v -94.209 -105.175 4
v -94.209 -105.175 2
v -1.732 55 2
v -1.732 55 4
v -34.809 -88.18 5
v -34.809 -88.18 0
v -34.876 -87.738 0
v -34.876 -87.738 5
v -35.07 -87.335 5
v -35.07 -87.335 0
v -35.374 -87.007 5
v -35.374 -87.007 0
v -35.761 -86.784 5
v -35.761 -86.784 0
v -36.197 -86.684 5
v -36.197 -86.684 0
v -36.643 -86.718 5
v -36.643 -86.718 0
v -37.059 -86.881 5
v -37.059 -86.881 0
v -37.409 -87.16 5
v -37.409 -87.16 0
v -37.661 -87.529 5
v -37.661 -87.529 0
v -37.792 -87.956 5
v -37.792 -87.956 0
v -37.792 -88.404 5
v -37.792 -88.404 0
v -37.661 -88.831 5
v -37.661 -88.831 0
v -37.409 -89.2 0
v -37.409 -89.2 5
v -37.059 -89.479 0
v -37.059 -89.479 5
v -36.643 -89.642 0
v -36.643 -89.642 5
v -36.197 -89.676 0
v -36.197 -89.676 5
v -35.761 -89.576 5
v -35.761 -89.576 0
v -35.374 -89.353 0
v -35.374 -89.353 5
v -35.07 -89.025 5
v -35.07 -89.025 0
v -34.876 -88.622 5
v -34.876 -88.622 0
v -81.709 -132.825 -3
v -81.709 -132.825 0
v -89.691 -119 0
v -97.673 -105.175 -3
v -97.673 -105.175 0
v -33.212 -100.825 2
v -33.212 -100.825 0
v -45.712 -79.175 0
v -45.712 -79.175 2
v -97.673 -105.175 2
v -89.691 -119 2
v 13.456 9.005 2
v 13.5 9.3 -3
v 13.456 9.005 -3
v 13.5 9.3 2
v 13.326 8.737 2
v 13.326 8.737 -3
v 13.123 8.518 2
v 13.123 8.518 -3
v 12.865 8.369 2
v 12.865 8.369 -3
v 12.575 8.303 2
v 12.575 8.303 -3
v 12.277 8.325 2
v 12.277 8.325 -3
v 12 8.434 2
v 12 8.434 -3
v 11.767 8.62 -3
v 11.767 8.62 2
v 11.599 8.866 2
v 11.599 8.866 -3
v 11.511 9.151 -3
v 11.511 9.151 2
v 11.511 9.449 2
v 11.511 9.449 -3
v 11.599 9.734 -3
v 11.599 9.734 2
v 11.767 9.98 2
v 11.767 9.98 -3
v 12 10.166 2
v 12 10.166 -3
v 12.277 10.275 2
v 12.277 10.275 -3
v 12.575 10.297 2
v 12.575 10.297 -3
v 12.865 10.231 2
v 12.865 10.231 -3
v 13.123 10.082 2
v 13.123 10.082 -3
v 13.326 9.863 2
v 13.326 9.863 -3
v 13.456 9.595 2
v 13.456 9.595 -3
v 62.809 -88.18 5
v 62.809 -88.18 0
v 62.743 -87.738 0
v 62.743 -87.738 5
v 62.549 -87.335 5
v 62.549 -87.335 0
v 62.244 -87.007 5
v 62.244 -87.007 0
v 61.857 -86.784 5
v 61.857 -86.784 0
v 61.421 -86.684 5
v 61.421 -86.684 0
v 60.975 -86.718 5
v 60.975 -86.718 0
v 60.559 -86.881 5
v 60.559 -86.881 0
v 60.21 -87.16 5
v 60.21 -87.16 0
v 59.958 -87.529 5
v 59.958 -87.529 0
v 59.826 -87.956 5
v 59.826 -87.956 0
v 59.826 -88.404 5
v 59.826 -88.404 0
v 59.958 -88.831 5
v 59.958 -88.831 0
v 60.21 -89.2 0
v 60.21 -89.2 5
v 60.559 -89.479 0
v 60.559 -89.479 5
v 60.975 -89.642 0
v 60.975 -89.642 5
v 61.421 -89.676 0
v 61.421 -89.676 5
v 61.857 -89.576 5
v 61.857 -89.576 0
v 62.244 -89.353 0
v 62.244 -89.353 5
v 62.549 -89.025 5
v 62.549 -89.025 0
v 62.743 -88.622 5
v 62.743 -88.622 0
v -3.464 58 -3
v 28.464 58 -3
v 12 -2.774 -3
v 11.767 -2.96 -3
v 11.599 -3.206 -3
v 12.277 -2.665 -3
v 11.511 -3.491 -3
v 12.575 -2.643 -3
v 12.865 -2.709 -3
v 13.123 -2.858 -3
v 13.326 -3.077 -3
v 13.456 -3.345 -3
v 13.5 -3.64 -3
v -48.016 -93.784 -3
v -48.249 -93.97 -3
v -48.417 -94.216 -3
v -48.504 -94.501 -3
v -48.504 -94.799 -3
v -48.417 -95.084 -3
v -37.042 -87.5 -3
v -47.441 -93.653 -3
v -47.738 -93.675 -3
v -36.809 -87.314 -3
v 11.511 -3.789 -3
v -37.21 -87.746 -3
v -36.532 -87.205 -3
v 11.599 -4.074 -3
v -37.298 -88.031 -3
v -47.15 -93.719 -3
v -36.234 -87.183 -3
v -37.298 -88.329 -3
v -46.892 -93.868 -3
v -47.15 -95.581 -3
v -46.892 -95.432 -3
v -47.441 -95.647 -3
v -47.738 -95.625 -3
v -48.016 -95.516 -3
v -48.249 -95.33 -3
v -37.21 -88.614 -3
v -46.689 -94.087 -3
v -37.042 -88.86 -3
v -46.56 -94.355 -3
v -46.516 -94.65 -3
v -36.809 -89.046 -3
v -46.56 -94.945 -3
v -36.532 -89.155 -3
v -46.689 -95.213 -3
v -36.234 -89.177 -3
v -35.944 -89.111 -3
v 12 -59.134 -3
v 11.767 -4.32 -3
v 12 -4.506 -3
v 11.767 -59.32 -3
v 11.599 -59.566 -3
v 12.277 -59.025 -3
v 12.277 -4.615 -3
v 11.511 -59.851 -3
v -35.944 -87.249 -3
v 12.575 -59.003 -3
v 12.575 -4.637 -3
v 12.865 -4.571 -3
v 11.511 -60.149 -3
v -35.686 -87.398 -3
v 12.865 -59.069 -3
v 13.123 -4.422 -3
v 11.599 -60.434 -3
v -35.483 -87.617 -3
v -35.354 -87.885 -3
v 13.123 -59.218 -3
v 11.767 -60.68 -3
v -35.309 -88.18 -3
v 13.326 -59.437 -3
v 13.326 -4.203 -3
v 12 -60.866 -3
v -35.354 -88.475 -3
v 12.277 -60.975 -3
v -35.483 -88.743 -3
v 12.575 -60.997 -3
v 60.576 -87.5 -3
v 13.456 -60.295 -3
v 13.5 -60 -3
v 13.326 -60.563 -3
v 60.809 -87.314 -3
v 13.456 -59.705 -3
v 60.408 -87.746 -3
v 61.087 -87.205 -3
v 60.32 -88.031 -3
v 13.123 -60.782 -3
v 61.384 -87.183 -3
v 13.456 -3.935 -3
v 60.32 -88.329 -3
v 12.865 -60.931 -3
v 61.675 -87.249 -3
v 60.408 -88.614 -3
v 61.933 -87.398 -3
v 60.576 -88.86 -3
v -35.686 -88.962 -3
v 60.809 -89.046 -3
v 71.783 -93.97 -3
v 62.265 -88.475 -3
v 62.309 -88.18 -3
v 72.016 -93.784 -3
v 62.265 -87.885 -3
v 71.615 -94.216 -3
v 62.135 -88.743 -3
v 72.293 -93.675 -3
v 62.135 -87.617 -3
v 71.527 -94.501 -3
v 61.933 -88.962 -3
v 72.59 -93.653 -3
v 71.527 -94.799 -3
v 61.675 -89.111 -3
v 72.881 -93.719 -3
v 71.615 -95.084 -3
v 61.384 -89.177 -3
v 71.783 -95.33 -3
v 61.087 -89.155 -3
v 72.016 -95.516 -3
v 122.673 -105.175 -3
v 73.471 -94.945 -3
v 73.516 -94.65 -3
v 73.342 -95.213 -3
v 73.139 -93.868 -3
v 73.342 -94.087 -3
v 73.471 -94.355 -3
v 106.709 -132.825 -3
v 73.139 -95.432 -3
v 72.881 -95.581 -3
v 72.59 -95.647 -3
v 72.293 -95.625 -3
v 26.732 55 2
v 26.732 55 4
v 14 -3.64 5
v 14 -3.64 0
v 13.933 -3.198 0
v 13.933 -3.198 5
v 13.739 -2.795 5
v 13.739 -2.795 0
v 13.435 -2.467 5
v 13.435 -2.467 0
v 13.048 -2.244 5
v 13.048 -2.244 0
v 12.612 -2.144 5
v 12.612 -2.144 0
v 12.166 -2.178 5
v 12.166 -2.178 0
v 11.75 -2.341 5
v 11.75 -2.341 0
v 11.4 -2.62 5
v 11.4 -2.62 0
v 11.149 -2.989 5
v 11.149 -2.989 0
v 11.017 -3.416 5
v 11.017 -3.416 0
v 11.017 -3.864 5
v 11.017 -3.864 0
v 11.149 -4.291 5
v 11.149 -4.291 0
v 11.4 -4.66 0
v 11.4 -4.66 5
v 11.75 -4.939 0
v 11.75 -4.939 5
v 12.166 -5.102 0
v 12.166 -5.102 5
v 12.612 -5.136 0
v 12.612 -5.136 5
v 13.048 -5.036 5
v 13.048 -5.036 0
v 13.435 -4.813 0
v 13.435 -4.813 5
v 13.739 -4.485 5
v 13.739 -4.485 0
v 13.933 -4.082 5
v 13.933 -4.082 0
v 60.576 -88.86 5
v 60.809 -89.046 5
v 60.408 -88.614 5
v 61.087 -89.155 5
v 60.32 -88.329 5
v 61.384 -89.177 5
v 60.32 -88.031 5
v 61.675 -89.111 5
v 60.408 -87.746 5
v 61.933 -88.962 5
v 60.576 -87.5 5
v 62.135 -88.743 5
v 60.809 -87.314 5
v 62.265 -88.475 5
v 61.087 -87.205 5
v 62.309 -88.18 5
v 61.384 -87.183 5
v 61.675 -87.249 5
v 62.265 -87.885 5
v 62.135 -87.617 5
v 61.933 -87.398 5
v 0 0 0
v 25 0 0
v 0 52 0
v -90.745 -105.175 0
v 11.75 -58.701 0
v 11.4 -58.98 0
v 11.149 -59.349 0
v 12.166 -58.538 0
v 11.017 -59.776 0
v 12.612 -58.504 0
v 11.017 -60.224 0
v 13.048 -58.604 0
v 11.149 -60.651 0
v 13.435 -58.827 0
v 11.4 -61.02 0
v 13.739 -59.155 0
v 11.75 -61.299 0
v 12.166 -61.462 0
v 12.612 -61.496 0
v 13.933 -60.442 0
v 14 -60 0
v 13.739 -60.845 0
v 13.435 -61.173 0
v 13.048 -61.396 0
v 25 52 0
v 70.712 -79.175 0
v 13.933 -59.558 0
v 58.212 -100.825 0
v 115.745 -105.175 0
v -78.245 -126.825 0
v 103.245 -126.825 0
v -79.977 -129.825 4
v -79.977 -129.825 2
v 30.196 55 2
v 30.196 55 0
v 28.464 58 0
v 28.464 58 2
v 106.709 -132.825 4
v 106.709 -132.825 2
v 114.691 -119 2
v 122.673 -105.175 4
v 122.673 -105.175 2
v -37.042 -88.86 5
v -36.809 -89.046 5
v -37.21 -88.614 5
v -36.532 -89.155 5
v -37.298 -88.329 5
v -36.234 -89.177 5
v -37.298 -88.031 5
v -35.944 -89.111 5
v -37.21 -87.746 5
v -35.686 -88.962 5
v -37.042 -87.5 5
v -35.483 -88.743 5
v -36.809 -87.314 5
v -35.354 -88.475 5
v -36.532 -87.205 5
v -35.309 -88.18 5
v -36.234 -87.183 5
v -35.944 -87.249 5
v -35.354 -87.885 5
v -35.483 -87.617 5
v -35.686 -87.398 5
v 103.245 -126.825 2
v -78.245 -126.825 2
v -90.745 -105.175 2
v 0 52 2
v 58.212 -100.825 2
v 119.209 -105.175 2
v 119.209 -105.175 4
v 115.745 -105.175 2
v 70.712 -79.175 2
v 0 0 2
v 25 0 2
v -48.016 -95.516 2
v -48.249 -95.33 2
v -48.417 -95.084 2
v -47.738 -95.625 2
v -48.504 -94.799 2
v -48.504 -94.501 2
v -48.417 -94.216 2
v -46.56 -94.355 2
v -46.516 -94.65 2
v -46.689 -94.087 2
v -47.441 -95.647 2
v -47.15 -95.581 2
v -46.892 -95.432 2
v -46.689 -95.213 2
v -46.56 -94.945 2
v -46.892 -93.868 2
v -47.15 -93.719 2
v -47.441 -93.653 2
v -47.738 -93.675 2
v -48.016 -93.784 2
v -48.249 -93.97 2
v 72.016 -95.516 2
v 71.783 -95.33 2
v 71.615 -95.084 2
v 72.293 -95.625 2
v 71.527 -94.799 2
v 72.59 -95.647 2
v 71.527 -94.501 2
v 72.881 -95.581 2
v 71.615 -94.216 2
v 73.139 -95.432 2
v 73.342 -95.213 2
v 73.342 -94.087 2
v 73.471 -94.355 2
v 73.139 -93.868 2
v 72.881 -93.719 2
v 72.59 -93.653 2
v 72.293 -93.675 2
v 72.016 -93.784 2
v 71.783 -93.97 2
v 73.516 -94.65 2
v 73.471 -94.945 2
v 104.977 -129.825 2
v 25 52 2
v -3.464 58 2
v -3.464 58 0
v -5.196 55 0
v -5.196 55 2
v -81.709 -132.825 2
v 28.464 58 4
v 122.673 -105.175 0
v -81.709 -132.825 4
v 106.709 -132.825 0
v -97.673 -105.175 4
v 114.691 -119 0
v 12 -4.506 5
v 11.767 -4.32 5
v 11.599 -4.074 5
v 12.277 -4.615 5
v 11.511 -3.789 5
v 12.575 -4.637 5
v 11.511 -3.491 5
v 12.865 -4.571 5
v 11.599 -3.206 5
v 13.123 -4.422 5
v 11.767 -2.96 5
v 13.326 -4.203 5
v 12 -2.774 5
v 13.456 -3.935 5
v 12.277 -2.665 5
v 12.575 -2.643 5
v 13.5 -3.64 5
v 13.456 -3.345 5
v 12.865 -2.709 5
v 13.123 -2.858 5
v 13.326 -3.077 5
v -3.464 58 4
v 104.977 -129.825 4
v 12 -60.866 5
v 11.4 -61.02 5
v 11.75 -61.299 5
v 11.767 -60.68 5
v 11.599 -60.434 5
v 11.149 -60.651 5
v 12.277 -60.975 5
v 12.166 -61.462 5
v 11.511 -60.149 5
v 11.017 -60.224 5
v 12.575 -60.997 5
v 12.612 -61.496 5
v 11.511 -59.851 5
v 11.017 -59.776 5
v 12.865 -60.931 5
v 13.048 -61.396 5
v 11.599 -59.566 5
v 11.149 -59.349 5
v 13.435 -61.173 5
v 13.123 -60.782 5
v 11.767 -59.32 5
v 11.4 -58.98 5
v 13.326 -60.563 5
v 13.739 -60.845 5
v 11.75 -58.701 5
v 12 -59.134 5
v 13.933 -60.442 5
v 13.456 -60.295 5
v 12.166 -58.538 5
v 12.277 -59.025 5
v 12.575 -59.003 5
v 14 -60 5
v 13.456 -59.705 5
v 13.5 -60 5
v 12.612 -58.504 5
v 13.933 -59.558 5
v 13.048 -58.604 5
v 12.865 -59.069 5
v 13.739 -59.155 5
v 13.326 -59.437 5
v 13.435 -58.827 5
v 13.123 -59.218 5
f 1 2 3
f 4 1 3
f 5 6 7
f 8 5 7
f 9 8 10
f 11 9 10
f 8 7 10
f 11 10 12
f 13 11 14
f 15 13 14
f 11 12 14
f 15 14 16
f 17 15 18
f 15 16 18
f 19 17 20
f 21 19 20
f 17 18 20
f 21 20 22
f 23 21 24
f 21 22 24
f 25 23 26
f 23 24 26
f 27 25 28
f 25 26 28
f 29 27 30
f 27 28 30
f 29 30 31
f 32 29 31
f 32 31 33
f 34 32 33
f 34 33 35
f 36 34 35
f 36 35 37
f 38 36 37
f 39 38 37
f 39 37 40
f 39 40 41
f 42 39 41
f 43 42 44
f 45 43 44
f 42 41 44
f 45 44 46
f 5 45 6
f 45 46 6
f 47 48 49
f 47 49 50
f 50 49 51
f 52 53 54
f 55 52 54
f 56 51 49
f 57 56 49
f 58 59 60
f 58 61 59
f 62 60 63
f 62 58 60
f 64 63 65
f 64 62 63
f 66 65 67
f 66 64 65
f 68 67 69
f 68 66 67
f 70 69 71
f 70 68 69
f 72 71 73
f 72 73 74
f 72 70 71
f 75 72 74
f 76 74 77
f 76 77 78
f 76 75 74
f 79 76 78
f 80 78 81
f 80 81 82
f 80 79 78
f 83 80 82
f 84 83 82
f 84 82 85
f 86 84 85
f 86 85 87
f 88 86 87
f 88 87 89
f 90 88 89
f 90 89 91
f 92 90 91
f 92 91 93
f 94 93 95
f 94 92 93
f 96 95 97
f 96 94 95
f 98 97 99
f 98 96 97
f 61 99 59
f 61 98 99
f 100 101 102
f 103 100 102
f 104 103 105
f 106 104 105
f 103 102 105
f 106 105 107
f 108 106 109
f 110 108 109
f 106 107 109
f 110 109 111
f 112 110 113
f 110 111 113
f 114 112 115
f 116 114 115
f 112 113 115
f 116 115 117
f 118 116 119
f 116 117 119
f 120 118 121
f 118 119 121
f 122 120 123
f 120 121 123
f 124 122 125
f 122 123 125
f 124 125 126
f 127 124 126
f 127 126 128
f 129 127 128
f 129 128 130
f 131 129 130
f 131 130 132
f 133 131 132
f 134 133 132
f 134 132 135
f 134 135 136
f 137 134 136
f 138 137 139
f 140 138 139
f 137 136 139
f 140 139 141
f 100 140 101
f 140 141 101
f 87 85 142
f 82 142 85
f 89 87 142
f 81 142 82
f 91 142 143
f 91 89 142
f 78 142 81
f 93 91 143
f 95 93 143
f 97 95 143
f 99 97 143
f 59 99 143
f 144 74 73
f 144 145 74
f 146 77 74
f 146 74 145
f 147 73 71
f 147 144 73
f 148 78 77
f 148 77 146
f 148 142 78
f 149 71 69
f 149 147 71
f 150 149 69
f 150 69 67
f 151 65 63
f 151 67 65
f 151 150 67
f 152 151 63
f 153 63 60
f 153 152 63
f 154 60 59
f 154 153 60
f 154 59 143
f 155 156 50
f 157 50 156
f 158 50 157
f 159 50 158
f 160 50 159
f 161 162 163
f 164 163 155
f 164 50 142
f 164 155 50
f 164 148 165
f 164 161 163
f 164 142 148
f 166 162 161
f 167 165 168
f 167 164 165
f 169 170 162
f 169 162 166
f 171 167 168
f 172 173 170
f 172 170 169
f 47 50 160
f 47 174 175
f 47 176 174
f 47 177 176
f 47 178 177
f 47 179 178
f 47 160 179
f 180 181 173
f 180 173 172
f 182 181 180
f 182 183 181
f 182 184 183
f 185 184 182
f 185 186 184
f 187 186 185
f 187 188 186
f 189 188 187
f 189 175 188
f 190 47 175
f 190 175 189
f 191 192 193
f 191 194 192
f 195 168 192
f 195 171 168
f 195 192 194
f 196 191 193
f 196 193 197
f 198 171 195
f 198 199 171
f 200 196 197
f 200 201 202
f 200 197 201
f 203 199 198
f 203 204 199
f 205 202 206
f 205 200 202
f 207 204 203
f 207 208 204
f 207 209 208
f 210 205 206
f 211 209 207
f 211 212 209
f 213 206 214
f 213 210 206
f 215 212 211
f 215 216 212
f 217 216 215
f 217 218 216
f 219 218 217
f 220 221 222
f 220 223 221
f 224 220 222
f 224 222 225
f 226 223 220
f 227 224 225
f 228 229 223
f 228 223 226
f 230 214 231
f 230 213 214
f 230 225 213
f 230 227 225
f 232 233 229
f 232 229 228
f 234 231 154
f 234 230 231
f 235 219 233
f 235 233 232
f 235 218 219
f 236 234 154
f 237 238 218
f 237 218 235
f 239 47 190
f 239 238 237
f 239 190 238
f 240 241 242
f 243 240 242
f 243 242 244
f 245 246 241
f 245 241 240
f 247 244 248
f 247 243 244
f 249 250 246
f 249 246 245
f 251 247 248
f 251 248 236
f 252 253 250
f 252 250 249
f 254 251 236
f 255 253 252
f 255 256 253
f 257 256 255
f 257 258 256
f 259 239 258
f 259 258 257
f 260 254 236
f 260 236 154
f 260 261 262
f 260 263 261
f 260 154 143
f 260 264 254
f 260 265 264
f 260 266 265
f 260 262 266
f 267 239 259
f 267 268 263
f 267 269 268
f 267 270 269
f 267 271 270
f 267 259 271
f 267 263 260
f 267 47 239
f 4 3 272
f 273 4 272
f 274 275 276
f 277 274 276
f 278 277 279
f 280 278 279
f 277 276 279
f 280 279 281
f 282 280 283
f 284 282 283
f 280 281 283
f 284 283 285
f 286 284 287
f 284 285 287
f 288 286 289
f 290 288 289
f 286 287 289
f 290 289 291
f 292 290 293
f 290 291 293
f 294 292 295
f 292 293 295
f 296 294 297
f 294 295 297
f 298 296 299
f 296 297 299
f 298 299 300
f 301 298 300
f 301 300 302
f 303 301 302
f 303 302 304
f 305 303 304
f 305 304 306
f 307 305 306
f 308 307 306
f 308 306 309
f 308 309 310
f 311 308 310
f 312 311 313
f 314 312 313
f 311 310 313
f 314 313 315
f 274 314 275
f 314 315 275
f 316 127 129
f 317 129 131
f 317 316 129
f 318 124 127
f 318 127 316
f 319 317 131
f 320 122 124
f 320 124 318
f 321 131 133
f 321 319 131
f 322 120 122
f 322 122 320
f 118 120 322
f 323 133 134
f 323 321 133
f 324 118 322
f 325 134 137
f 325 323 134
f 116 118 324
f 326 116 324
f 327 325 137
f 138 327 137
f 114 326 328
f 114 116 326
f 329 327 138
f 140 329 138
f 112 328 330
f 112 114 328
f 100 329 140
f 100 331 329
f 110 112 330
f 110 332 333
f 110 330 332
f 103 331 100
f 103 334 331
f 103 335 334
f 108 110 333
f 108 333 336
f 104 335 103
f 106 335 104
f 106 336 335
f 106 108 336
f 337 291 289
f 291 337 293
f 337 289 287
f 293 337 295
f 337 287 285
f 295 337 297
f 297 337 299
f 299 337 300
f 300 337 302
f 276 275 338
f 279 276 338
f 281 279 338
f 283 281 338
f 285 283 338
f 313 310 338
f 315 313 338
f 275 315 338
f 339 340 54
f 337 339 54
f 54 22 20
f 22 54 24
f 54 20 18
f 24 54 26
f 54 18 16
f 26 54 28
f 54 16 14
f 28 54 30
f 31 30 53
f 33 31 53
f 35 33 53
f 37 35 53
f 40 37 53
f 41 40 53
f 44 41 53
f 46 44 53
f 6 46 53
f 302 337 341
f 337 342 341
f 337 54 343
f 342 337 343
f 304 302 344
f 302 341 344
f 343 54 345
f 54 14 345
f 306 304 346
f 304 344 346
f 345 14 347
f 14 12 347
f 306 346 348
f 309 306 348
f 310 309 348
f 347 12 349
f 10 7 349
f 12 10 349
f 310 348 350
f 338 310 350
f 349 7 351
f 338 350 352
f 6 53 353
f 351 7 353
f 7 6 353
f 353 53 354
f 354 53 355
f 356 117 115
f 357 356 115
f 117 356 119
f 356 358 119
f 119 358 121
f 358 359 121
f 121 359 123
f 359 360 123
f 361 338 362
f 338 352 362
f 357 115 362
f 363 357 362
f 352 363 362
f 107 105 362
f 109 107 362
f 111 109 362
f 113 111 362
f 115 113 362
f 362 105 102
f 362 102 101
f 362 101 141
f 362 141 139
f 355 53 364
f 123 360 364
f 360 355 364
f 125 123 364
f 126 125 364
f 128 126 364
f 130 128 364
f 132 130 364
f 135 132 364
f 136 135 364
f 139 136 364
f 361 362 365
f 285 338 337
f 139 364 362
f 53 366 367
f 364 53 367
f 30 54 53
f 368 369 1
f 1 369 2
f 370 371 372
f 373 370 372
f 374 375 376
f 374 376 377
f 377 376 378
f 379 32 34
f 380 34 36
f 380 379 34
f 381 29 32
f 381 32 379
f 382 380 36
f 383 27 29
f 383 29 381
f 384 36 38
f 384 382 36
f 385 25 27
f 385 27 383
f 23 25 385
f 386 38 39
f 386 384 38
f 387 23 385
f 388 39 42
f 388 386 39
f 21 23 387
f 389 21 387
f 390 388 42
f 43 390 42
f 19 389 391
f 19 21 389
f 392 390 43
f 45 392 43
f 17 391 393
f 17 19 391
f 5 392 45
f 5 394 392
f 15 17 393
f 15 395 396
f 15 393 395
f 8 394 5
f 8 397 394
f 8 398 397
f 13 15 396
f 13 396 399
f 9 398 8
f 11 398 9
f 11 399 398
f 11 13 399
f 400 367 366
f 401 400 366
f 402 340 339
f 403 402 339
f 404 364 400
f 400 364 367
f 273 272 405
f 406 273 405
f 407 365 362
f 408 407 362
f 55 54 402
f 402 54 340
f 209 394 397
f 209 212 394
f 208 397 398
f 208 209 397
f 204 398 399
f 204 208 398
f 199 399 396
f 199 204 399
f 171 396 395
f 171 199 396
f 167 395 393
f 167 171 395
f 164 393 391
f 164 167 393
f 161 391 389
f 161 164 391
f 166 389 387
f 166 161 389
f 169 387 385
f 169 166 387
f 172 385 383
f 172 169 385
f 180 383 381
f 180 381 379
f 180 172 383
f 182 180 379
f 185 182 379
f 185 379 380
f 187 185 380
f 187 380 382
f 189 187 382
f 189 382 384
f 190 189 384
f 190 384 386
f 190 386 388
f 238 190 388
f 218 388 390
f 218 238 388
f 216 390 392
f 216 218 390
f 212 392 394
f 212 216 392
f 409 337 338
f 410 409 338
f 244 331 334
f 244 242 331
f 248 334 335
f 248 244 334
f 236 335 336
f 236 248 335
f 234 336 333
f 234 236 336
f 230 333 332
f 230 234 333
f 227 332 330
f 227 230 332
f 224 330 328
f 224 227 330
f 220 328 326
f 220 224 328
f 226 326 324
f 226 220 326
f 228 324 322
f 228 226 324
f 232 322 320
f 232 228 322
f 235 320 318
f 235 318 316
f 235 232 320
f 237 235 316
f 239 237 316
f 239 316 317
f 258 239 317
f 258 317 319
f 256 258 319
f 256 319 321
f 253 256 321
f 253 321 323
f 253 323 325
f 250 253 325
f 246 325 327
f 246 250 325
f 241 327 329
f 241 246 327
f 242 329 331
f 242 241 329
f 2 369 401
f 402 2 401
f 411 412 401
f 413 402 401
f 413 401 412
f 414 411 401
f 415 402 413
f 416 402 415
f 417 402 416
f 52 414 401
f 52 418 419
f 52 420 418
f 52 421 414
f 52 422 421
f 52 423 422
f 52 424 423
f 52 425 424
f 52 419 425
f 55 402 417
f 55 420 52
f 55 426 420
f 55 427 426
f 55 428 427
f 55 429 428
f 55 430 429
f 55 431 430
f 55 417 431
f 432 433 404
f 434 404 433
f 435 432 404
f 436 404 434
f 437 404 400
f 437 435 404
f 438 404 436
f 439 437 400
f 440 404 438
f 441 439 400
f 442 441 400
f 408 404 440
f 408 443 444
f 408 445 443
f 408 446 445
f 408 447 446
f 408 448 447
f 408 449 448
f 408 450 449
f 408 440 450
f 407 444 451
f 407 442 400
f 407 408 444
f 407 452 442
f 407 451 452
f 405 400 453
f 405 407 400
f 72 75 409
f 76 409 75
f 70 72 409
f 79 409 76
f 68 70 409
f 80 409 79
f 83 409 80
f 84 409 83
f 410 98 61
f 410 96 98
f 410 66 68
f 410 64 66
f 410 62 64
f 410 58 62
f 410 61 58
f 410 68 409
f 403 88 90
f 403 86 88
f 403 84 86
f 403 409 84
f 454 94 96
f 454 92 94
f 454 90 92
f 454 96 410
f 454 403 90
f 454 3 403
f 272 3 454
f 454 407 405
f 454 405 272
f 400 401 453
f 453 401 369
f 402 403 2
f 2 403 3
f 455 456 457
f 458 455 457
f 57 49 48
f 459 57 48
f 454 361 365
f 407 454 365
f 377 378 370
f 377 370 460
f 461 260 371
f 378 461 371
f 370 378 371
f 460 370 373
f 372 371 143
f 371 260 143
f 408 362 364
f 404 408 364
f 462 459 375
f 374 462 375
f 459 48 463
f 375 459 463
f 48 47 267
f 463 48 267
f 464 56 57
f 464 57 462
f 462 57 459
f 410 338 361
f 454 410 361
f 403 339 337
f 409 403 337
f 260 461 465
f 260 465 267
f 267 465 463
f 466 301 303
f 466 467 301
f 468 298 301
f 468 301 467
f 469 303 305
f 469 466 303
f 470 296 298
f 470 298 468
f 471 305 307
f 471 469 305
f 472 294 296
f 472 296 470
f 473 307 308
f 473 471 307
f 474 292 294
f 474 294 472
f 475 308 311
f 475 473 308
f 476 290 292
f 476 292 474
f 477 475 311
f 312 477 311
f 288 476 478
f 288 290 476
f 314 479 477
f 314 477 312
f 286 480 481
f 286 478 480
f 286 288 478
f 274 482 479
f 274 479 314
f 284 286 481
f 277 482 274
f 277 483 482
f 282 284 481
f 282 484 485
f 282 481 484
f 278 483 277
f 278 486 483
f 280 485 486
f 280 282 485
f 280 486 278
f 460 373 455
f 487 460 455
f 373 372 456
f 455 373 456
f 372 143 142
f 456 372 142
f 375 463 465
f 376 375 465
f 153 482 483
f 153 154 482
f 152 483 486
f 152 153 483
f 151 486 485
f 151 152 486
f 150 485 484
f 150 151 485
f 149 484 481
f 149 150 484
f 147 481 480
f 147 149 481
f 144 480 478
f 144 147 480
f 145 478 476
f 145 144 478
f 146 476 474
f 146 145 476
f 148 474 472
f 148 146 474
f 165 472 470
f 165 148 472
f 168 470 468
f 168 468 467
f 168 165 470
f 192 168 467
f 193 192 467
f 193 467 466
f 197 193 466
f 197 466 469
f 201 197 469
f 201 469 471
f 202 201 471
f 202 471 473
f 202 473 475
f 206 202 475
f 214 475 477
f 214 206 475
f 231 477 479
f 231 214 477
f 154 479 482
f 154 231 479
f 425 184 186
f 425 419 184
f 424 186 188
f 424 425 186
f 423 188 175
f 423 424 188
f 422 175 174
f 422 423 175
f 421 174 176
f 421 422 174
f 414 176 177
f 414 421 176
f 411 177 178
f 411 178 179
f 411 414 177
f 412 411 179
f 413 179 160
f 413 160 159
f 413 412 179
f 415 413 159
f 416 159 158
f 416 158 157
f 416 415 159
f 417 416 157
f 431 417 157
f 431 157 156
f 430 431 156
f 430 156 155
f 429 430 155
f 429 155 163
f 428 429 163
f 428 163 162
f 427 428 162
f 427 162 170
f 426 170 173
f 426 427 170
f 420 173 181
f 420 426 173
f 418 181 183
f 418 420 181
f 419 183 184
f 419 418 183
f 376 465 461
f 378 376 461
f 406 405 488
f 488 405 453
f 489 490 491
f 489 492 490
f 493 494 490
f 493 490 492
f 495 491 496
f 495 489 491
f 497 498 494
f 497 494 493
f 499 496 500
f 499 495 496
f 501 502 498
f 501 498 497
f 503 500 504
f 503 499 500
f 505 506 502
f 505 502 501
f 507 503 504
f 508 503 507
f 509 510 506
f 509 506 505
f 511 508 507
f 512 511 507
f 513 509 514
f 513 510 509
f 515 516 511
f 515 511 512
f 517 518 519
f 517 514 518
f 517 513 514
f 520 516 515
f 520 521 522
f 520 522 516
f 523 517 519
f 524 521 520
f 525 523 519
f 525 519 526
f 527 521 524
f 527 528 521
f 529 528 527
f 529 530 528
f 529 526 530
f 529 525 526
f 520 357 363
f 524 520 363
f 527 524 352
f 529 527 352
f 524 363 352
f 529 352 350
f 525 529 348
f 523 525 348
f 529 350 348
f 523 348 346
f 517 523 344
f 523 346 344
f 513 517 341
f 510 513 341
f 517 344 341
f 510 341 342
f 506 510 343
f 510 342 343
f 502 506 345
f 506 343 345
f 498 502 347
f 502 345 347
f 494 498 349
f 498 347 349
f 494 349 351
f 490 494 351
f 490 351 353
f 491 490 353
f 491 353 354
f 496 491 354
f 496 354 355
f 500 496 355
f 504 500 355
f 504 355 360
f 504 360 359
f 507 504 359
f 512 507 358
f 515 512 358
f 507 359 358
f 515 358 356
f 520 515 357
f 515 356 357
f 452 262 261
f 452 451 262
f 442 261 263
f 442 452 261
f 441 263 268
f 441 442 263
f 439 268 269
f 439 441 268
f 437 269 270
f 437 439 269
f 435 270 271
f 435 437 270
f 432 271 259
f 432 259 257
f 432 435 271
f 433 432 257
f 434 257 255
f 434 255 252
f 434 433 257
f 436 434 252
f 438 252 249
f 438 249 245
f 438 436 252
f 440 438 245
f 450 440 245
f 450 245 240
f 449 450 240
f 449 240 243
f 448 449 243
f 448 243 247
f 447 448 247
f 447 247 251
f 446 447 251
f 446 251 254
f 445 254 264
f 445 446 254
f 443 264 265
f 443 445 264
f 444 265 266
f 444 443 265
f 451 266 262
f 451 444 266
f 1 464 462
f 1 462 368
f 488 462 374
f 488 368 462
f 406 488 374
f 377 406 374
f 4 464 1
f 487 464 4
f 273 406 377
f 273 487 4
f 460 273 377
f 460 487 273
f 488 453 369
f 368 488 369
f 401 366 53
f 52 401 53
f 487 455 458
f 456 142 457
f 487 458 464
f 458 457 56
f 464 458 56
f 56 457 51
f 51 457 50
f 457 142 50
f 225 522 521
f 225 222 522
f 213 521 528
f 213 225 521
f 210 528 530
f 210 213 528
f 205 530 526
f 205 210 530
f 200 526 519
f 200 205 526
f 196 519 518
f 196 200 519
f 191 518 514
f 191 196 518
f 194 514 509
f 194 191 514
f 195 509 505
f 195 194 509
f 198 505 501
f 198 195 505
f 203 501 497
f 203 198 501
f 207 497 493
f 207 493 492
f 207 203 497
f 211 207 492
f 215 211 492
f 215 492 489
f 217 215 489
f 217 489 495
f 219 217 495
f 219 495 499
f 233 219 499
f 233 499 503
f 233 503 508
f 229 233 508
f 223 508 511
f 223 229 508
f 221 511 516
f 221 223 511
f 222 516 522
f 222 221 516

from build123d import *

# Parameters (mm, degrees)
F0_R     = 1
F1_DEPTH = 2
F2_R     = 1
F3_DEPTH = 3
F4_R     = 1.5
F4_R_2   = 1
F5_DEPTH = 5
F7_DEPTH = 2


with BuildPart() as f1:
    # F0 (on Top) → F1 (new body)
    with BuildSketch(Plane.XY):
        Polygon((0, 52), (0, 0), (25, 0), (25, 52), (12.5, 52), align=None)
        with Locations((12.5, 9.3)):
            Circle(F0_R, mode=Mode.SUBTRACT)
        Polygon((109.4948452239, -116), (115.7448452239, -105.1746824527), (70.7115242271, -79.1746824527), (64.4615242271, -90), (58.2115242271, -100.8253175473), (103.2448452239, -126.8253175473), align=None)
        with Locations((72.5155604823, -94.65)):
            Circle(F0_R, mode=Mode.SUBTRACT)
        Polygon((-90.7448452239, -105.1746824527), (0, 52), (12.5, 52), (12.5, 58), (-3.4641016151, 58), (-5.1961524227, 55), (-50.5685750346, -23.5873412263), (-97.6730484541, -105.1746824527), (-89.6909976466, -119), (-84.4948452239, -116), align=None)
        Polygon((12.5, 52), (25, 52), (115.7448452239, -105.1746824527), (109.4948452239, -116), (114.6909976466, -119), (122.6730484541, -105.1746824527), (75.5685750346, -23.5873412263), (30.1961524227, 55), (28.4641016151, 58), (12.5, 58), align=None)
        Polygon((-45.7115242271, -79.1746824527), (-90.7448452239, -105.1746824527), (-84.4948452239, -116), (-78.2448452239, -126.8253175473), (-33.2115242271, -100.8253175473), (-39.4615242271, -90), align=None)
        with Locations((-47.5155604823, -94.65)):
            Circle(F0_R, mode=Mode.SUBTRACT)
        Polygon((-78.2448452239, -126.8253175473), (-84.4948452239, -116), (-89.6909976466, -119), (-81.708946839, -132.8253175473), (12.5, -132.8253175473), (106.708946839, -132.8253175473), (114.6909976466, -119), (109.4948452239, -116), (103.2448452239, -126.8253175473), align=None)
    extrude(amount=F1_DEPTH)

    # F2 (on face) → F3 (join)
    with BuildSketch(Plane(origin=(0, 0, 0), x_dir=(1, 0, 0), z_dir=(0, 0, -1))):
        Polygon((-3.4641016151, -58), (28.4641016151, -58), (122.6730484541, 105.1746824527), (106.708946839, 132.8253175473), (-81.708946839, 132.8253175473), (-97.6730484541, 105.1746824527), align=None)
        with Locations((12.5, -9.3)):
            Circle(F2_R, mode=Mode.SUBTRACT)
        Polygon((25, 0), (0, 0), (0, -52), (-90.7448452239, 105.1746824527), (-45.7115242271, 79.1746824527), (-33.2115242271, 100.8253175473), (-78.2448452239, 126.8253175473), (103.2448452239, 126.8253175473), (58.2115242271, 100.8253175473), (70.7115242271, 79.1746824527), (115.7448452239, 105.1746824527), (25, -52), align=None, mode=Mode.SUBTRACT)
        with Locations((-47.5155604823, 94.65)):
            Circle(F2_R, mode=Mode.SUBTRACT)
        with Locations((72.5155604823, 94.65)):
            Circle(F2_R, mode=Mode.SUBTRACT)
        Polygon((0, -52), (0, 0), (25, 0), (25, -52), (115.7448452239, 105.1746824527), (70.7115242271, 79.1746824527), (58.2115242271, 100.8253175473), (103.2448452239, 126.8253175473), (-78.2448452239, 126.8253175473), (-33.2115242271, 100.8253175473), (-45.7115242271, 79.1746824527), (-90.7448452239, 105.1746824527), align=None)
        with Locations((12.5, 3.64)):
            Circle(F2_R, mode=Mode.SUBTRACT)
        with Locations((12.5, 60)):
            Circle(F2_R, mode=Mode.SUBTRACT)
        with Locations((-36.3091917573, 88.18)):
            Circle(F2_R, mode=Mode.SUBTRACT)
        with Locations((61.3091917573, 88.18)):
            Circle(F2_R, mode=Mode.SUBTRACT)
    extrude(amount=F3_DEPTH)

    # F4 (on face) → F5 (join)
    with BuildSketch(Plane.XY):
        with Locations((-36.3091917573, -88.18)):
            Circle(F4_R)
        with Locations((-36.3091917573, -88.18)):
            Circle(F4_R_2, mode=Mode.SUBTRACT)
        with Locations((61.3091917573, -88.18)):
            Circle(F4_R)
        with Locations((61.3091917573, -88.18)):
            Circle(F4_R_2, mode=Mode.SUBTRACT)
        with Locations((12.5, -60)):
            Circle(F4_R)
        with Locations((12.5, -60)):
            Circle(F4_R_2, mode=Mode.SUBTRACT)
        with Locations((12.5, -3.64)):
            Circle(F4_R)
        with Locations((12.5, -3.64)):
            Circle(F4_R_2, mode=Mode.SUBTRACT)
    extrude(amount=F5_DEPTH)

    # F6 (on face) → F7 (join)
    with BuildSketch(Plane.XY.offset(2)):
        Polygon((106.708946839, -132.8253175473), (122.6730484541, -105.1746824527), (28.4641016151, 58), (-3.4641016151, 58), (-97.6730484541, -105.1746824527), (-81.708946839, -132.8253175473), align=None)
        Polygon((-94.208946839, -105.1746824527), (-47.9704988233, -25.0873412263), (-1.7320508076, 55), (12.5, 55), (26.7320508076, 55), (72.9704988233, -25.0873412263), (119.208946839, -105.1746824527), (112.0929214352, -117.5), (104.9768960314, -129.8253175473), (12.5, -129.8253175473), (-79.9768960314, -129.8253175473), (-87.0929214352, -117.5), align=None, mode=Mode.SUBTRACT)
    extrude(amount=F7_DEPTH)


solid = f1.part
